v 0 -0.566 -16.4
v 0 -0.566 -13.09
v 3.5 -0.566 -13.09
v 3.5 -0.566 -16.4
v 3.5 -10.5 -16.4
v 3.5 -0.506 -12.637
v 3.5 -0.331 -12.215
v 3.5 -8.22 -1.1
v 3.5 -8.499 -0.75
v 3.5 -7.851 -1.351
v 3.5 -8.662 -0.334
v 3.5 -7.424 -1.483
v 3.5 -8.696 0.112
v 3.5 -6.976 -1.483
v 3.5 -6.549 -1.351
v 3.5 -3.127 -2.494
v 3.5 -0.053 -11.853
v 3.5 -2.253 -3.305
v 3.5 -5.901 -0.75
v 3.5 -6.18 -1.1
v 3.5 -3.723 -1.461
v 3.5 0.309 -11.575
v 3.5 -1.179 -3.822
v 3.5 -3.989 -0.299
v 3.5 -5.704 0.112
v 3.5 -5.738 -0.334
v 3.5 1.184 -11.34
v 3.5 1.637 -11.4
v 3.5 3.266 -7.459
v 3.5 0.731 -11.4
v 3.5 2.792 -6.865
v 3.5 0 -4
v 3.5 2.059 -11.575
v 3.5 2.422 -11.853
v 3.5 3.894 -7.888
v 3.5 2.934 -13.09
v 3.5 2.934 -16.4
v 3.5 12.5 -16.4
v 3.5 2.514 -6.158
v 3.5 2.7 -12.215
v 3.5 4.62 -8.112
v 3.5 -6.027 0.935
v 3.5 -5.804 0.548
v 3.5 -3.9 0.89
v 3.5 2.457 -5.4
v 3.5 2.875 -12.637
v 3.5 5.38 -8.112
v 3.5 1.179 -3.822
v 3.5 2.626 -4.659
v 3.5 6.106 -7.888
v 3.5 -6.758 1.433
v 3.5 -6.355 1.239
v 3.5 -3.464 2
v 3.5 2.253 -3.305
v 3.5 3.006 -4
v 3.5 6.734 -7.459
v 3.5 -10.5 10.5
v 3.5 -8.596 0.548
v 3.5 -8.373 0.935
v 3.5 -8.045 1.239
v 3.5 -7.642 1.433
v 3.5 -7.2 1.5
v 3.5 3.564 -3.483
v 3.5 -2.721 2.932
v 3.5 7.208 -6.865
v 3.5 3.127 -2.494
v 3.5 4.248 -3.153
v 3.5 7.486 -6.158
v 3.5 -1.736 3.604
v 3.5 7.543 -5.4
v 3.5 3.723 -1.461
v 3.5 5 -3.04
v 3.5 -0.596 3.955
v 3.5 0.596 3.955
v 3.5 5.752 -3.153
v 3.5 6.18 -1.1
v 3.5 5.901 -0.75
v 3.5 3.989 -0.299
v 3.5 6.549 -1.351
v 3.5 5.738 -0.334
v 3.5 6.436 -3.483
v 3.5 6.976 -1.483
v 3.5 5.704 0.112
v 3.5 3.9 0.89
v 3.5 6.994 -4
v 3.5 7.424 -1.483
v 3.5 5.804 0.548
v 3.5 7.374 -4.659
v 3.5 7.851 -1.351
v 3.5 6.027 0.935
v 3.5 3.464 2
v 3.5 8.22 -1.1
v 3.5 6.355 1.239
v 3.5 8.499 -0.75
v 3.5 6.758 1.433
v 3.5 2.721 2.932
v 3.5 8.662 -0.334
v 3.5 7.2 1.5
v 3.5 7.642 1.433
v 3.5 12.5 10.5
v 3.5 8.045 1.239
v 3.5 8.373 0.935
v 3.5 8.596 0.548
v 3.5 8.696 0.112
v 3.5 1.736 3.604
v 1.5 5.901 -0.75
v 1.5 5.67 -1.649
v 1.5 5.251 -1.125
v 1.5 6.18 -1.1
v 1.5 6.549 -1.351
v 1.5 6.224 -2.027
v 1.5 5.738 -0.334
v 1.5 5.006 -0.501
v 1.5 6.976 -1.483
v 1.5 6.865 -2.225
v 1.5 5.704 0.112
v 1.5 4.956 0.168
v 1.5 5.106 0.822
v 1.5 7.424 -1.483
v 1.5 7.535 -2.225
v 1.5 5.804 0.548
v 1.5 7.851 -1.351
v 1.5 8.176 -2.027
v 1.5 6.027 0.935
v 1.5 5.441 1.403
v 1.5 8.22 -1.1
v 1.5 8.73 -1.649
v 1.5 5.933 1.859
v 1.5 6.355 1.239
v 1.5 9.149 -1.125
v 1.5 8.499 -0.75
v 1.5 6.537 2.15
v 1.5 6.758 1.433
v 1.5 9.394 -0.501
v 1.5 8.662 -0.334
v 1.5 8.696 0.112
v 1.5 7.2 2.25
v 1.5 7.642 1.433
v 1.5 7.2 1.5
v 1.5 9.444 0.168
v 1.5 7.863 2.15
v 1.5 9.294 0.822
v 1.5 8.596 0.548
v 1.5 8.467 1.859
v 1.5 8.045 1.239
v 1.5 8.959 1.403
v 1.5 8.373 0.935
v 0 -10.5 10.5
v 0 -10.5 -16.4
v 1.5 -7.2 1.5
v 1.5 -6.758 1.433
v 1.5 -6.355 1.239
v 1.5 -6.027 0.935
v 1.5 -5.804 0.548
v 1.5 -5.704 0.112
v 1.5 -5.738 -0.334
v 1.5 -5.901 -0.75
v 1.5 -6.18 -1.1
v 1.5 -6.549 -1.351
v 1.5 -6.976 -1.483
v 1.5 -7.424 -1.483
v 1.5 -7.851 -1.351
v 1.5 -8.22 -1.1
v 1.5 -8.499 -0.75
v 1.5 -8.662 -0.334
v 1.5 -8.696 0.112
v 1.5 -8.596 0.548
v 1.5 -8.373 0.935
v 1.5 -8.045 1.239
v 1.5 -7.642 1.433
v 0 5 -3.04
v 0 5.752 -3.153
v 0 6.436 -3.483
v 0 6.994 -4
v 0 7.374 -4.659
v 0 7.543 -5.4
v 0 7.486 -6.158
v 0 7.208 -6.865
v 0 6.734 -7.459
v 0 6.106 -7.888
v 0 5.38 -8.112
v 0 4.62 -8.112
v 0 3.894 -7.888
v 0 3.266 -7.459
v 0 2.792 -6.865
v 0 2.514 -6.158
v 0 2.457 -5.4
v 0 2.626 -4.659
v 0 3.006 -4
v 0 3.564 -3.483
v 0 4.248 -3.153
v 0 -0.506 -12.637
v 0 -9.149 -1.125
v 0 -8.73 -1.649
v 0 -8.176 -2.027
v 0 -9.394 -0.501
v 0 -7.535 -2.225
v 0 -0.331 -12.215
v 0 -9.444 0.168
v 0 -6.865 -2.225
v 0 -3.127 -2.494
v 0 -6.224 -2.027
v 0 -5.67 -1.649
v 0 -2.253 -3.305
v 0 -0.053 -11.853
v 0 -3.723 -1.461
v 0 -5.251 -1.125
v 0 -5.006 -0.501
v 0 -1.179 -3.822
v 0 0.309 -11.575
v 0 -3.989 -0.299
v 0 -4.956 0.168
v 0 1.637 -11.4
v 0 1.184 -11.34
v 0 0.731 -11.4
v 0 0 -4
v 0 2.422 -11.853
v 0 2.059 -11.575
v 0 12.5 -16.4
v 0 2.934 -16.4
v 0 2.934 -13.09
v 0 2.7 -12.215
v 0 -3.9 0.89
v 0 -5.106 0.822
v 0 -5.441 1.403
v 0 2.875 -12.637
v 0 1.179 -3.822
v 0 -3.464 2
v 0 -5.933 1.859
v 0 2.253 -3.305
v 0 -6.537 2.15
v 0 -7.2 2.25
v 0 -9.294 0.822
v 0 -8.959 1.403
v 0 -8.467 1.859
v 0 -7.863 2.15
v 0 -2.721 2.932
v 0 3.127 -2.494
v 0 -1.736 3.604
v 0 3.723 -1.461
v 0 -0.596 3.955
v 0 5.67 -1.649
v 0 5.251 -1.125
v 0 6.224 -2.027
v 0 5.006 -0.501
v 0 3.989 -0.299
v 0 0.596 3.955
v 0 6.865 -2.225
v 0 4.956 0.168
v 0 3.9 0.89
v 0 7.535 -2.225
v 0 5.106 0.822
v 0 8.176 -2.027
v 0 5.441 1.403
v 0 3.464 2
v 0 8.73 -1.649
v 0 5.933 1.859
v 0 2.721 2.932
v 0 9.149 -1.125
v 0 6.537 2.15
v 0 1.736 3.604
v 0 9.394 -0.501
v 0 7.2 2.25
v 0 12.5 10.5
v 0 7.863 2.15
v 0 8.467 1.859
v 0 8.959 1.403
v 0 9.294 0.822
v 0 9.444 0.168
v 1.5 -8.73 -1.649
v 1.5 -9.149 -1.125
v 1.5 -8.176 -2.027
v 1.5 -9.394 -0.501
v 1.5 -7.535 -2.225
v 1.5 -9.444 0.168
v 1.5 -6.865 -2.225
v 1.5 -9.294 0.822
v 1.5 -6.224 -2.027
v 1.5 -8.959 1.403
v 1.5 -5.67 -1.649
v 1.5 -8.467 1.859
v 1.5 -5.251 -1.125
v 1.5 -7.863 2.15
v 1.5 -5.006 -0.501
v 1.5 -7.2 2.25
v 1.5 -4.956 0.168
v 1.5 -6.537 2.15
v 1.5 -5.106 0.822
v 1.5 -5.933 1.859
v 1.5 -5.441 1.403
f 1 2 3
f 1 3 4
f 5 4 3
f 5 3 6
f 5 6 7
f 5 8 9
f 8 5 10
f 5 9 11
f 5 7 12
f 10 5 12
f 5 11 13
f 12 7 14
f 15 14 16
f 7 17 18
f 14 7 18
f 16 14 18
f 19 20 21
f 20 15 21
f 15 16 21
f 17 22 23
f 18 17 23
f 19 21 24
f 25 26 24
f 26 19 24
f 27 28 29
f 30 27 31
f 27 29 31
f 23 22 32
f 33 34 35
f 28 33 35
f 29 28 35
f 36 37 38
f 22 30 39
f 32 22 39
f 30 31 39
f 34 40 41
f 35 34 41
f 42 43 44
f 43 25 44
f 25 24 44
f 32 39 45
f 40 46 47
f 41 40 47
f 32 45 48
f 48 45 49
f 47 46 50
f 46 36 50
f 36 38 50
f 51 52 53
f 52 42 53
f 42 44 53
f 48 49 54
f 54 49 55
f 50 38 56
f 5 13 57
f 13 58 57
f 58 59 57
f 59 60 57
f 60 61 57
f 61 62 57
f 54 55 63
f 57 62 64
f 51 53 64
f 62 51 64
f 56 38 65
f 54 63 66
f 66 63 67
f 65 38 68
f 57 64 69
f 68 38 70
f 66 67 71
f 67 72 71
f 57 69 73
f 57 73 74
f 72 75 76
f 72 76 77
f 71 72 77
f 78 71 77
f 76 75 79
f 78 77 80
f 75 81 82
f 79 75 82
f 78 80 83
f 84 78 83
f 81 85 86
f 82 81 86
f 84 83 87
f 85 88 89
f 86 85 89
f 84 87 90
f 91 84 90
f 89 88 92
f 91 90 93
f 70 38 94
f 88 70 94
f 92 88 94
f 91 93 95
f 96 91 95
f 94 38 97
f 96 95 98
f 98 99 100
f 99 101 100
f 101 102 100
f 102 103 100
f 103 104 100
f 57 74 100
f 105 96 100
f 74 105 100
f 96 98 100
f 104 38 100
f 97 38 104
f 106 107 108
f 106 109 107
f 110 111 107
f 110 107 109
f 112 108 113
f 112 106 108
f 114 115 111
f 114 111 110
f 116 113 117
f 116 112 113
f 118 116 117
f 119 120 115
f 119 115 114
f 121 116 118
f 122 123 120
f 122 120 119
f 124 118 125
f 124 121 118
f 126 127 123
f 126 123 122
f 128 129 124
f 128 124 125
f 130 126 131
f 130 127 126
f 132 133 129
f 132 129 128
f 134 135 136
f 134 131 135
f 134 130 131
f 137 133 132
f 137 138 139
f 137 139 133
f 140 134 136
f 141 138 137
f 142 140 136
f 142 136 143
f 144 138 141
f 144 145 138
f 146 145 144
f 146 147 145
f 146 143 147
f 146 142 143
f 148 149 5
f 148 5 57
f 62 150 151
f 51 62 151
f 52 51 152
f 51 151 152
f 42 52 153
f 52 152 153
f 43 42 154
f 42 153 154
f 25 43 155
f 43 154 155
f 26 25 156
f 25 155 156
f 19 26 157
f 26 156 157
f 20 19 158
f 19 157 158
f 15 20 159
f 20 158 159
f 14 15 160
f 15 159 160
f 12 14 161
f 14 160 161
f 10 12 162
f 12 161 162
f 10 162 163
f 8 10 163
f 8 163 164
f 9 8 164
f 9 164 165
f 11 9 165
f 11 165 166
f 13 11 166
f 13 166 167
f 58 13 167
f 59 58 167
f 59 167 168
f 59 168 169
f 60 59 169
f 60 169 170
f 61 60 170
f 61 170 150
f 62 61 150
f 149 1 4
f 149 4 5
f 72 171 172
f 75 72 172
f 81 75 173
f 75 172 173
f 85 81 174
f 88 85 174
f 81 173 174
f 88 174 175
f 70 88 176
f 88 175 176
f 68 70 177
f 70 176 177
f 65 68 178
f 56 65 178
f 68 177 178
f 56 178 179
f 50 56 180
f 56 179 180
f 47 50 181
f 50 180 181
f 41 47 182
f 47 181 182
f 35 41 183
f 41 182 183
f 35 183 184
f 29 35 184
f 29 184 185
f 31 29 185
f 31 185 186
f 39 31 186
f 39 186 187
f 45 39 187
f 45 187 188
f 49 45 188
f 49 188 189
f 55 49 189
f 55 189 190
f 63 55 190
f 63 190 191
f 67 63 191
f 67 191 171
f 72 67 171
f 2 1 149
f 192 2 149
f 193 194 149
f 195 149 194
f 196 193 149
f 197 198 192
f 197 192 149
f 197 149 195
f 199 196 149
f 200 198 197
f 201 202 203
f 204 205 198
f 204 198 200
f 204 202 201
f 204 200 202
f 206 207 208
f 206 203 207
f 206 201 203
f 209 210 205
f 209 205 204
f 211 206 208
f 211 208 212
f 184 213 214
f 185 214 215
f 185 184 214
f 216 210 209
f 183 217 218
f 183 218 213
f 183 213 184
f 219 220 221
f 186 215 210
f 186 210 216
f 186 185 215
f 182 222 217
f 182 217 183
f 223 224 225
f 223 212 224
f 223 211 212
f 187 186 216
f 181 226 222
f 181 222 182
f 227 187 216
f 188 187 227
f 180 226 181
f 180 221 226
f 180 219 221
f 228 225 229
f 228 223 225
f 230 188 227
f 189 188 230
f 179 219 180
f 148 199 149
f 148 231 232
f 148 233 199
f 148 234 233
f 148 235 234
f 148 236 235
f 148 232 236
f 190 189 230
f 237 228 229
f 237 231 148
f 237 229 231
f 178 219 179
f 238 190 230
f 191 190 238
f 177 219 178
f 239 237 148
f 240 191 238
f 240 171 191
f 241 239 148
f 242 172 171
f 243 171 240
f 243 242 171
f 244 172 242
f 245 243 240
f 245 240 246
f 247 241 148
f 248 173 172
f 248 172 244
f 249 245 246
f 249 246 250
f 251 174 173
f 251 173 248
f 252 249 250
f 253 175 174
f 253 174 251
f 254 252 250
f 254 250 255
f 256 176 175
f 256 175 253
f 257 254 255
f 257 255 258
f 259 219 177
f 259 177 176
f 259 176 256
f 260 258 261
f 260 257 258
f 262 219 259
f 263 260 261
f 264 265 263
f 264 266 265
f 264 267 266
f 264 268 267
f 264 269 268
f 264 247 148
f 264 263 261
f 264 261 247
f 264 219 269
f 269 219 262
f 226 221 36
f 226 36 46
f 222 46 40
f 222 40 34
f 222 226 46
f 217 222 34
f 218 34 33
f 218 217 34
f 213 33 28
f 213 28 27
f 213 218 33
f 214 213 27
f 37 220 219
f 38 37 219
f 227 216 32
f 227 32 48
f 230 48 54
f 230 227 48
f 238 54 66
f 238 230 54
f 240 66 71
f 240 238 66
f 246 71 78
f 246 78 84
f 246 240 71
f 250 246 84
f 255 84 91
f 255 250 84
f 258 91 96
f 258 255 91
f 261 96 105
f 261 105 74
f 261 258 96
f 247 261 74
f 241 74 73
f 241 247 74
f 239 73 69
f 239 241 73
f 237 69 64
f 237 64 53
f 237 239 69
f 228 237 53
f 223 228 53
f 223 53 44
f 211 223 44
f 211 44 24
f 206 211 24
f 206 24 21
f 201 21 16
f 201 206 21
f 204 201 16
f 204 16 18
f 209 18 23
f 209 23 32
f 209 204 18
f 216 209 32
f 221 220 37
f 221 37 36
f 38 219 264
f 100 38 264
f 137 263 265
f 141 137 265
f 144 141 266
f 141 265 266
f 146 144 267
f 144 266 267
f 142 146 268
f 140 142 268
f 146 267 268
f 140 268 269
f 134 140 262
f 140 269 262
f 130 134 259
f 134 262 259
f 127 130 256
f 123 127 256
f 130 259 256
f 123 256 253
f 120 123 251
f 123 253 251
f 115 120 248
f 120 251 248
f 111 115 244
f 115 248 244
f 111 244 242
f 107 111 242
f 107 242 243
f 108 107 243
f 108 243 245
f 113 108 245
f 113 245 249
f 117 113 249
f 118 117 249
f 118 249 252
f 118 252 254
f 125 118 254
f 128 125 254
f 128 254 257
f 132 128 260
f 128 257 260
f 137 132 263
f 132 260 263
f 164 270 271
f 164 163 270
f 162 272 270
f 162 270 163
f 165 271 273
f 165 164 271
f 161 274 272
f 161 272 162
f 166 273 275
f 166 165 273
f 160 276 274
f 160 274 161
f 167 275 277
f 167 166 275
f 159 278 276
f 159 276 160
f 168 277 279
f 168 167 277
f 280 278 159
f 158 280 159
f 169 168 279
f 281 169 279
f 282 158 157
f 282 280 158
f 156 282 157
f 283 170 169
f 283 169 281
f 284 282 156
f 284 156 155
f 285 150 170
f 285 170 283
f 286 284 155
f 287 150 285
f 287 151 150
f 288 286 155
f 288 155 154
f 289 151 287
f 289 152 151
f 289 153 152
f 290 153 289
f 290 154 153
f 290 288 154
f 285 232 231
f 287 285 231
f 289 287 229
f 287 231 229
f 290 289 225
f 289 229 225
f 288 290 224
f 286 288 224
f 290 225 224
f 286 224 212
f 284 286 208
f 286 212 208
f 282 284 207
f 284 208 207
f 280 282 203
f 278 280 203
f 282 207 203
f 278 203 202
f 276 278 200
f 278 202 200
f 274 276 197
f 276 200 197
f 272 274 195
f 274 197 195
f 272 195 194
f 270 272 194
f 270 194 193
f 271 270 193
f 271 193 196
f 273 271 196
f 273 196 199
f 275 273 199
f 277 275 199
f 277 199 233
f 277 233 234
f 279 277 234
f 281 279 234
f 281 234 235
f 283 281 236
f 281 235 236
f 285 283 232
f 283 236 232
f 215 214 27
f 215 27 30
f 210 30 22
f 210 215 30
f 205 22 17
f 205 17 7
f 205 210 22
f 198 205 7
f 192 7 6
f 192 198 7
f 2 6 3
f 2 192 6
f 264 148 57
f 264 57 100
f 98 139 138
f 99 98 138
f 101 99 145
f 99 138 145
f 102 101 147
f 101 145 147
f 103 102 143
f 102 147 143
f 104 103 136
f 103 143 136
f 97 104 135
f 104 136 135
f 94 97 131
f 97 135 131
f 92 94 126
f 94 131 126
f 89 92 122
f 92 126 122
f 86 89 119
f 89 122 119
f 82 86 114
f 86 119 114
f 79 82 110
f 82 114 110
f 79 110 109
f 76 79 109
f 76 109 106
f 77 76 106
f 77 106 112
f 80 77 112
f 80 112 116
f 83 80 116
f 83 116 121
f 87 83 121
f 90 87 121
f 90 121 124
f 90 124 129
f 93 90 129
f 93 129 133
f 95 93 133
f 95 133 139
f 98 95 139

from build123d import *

# Parameters (mm, degrees)
SKETCH_1_W          = 21
SKETCH_1_H          = 21
SKETCH_1_R          = 4
EXTRUDE_1_DEPTH     = 3.5
SKETCH_2_R          = 2.25
SKETCH_2_R_2        = 1.5
CUT_EXTRUDE_1_DEPTH = 1.5
SKETCH_2_2_R        = 1.5
CUT_EXTRUDE_2_DEPTH = 16.256146302
SKETCH_4_R          = 2.55
CUT_EXTRUDE_3_DEPTH = 16.256146302
EXTRUDE_2_DEPTH     = 3.5
SKETCH_6_W          = 26.9
SKETCH_6_H          = 2
EXTRUDE_3_DEPTH     = 3.5


with BuildPart() as part:
    # 草图1 → 凸台-拉伸1 (new body)
    with BuildSketch(Plane(origin=(0, 0, 0), x_dir=(0, 0, -1), z_dir=(1, 0, 0))):
        Rectangle(SKETCH_1_W, SKETCH_1_H)
        Circle(SKETCH_1_R, mode=Mode.SUBTRACT)
    extrude(amount=EXTRUDE_1_DEPTH)

    # 草图2 → 切除-拉伸1 (cut)
    # profile 1 of 2: a face of its own
    with BuildSketch(Plane.ZY):
        with Locations((0, 7.2)):
            Circle(SKETCH_2_R)
        with Locations((0, 7.2)):
            Circle(SKETCH_2_R_2, mode=Mode.SUBTRACT)
    # profile 2 of 2: a face of its own
    with BuildSketch(Plane.ZY):
        with Locations((0, -7.2)):
            Circle(SKETCH_2_R)
        with Locations((0, -7.2)):
            Circle(SKETCH_2_R_2, mode=Mode.SUBTRACT)
    extrude(amount=-CUT_EXTRUDE_1_DEPTH, mode=Mode.SUBTRACT)

    # 草图2<2> → 切除-拉伸2 (cut, through all)
    with BuildSketch(Plane.ZY):
        with Locations((0, 7.2)):
            Circle(SKETCH_2_2_R)
        with Locations((0, -7.2)):
            Circle(SKETCH_2_2_R)
    extrude(amount=-CUT_EXTRUDE_2_DEPTH, mode=Mode.SUBTRACT)

    # 草图4 → 切除-拉伸3 (cut, through all)
    with BuildSketch(Plane.ZY):
        with Locations((-5.590169944, 5)):
            Circle(SKETCH_4_R)
    extrude(amount=-CUT_EXTRUDE_3_DEPTH, mode=Mode.SUBTRACT)

    # 草图5 → 凸台-拉伸2 (add)
    with BuildSketch(Plane.ZY):
        with BuildLine():
            Line((-10.5, -10.5), (-10.5, 10.5))
            Line((-10.5, 10.5), (-16.4, 10.5))
            Line((-16.4, 10.5), (-16.4, 2.934341014))
            Line((-16.4, 2.934341014), (-13.090169944, 2.934341014))
            ThreePointArc((-13.090169944, 2.934341014), (-11.852733077, 2.421777882), (-11.340169944, 1.184341014))
            ThreePointArc((-11.340169944, 1.184341014), (-11.852733077, -0.053095853), (-13.090169944, -0.565658986))
            Line((-13.090169944, -0.565658986), (-16.4, -0.565658986))
            Line((-16.4, -0.565658986), (-16.4, -10.5))
            Line((-16.4, -10.5), (-10.5, -10.5))
        make_face()
    extrude(amount=-EXTRUDE_2_DEPTH)

    # 草图6 → 凸台-拉伸3 (add)
    with BuildSketch(Plane.ZY):
        with Locations((-2.95, 11.5)):
            Rectangle(SKETCH_6_W, SKETCH_6_H)
    extrude(amount=-EXTRUDE_3_DEPTH)


solid = part.part
